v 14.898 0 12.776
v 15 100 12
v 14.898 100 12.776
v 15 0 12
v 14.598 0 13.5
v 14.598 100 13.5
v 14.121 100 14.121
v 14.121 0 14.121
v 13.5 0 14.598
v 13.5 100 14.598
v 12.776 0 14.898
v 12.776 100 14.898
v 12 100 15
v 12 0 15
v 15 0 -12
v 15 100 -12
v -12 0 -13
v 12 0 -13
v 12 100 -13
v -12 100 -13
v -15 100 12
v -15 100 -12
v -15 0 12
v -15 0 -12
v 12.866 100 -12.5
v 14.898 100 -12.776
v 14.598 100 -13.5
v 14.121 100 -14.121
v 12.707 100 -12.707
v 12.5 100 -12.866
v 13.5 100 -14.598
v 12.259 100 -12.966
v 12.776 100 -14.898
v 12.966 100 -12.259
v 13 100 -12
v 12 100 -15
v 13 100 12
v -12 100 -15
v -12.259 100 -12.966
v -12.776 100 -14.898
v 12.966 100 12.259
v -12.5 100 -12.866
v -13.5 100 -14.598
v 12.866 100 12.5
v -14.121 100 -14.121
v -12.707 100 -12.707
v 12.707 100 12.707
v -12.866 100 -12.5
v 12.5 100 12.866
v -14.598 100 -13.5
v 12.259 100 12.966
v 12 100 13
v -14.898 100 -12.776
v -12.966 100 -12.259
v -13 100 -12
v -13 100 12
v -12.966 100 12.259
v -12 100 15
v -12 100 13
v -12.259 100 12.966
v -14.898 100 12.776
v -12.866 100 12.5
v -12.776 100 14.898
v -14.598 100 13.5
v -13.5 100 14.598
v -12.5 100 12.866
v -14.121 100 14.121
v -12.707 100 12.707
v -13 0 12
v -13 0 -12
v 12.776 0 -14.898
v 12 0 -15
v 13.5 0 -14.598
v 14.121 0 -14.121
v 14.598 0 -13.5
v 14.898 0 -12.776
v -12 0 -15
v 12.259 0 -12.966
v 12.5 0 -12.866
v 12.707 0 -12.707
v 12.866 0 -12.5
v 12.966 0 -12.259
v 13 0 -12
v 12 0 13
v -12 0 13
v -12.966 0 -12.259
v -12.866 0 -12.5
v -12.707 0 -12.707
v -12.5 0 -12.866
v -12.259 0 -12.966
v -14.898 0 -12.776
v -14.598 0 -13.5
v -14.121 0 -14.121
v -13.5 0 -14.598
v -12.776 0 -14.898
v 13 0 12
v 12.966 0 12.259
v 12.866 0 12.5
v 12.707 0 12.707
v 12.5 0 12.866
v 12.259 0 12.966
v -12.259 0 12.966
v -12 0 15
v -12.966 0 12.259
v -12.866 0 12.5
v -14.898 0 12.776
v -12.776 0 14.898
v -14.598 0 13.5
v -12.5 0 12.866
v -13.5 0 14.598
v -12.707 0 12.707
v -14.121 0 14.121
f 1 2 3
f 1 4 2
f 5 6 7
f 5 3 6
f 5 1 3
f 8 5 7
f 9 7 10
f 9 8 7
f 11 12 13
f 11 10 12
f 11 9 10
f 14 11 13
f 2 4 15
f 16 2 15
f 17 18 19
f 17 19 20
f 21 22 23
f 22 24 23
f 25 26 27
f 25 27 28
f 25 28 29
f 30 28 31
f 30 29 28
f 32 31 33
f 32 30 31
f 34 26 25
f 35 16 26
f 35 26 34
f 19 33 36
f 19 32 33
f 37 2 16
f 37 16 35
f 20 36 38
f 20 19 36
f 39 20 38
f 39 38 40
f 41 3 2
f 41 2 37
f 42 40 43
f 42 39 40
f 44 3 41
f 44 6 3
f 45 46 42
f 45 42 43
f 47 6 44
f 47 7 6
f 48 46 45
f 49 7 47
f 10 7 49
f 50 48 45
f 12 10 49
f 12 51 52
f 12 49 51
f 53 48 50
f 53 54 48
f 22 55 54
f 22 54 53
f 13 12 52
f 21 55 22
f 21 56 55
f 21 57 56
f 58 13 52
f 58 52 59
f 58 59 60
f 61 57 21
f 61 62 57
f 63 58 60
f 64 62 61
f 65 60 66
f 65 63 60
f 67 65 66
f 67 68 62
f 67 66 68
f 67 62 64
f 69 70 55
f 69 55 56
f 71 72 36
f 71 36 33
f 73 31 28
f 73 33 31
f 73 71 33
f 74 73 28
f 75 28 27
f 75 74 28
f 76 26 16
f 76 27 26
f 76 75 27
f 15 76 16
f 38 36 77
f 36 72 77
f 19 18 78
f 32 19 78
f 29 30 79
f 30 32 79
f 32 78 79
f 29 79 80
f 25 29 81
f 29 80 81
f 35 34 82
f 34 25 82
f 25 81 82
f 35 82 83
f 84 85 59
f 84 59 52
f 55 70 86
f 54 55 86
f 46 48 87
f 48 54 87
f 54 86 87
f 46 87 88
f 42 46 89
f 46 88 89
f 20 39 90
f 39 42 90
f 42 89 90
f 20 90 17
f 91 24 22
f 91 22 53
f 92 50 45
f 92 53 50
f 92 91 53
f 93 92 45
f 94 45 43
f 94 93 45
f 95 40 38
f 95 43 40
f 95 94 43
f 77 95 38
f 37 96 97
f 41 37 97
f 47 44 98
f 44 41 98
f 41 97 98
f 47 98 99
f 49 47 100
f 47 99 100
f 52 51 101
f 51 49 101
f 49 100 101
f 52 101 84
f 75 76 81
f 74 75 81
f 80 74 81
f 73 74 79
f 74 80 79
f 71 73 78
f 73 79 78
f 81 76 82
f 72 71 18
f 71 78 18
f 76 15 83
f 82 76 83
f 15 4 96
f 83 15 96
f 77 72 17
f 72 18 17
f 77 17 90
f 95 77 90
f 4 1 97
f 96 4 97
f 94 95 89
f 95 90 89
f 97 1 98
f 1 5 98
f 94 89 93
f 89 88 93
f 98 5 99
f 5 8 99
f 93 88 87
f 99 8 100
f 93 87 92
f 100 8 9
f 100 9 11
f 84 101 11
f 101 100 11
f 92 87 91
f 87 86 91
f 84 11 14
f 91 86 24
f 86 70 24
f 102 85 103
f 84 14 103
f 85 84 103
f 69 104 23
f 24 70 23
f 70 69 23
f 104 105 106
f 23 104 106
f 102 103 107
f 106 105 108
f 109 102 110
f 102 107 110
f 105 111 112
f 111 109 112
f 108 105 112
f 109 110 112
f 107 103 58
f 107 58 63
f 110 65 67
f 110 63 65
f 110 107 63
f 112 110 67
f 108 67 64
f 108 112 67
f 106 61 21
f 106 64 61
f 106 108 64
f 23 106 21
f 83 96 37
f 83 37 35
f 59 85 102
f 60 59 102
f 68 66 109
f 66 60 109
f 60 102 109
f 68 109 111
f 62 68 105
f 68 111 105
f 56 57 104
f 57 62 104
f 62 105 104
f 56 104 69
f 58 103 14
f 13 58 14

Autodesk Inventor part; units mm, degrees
ref_plane "YZ Plane" through (0, 0, 0) normal (1, 0, 0) x (0, 1, 0)
ref_plane "XZ Plane" through (0, 0, 0) normal (0, 1, 0) x (-1, 0, 0)
ref_plane "XY Plane" through (0, 0, 0) normal (0, 0, 1) x (1, 0, 0)
sketch "Sketch1" plane through (0, 0, 0) normal (0, 1, 0) x (-1, 0, 0)
  line L0 (-12, 14) -> (12, 14) construction
  line L1 (14, 12) -> (14, -12) construction
  line L2 (12, -14) -> (-12, -14) construction
  line L3 (-14, -12) -> (-14, 12) construction
  line L4 (-14, 14) -> (14, -14) construction
  line L5 (14, 14) -> (-14, -14) construction
  arc A0 (14, 12) -> (12, 14) centre (12, 12) ccw construction
  arc A1 (12, -14) -> (14, -12) centre (12, -12) ccw construction
  arc A2 (-14, -12) -> (-12, -14) centre (-12, -12) ccw construction
  arc A3 (-12, 14) -> (-14, 12) centre (-12, 12) ccw construction
  line L6 (-12, -15) -> (12, -15)
  arc A4 (12, -15) -> (15, -12) centre (12, -12) ccw
  line L7 (15, -12) -> (15, 12)
  arc A5 (15, 12) -> (12, 15) centre (12, 12) ccw
  line L8 (12, 15) -> (-12, 15)
  arc A6 (-12, 15) -> (-15, 12) centre (-12, 12) ccw
  line L9 (-15, 12) -> (-15, -12)
  arc A7 (-15, -12) -> (-12, -15) centre (-12, -12) ccw
  line L10 (13, -12) -> (13, 12)
  arc A8 (13, 12) -> (12, 13) centre (12, 12) ccw
  line L11 (12, 13) -> (-12, 13)
  arc A9 (-12, 13) -> (-13, 12) centre (-12, 12) ccw
  line L12 (-13, 12) -> (-13, -12)
  arc A10 (-13, -12) -> (-12, -13) centre (-12, -12) ccw
  line L13 (-12, -13) -> (12, -13)
  arc A11 (12, -13) -> (13, -12) centre (12, -12) ccw
  point P0 (0, 0)
  point P1 (0, 0)
  point P2 (0, 0)
  dimension "d10" = 2
  dimension "depth" = 30
  dimension "width" = 30
  dimension "thickness" = 2
extrude "Extrusion1" add sketch "Sketch1" along normal blind 100
equation "\"d10\" = thickness"
properties part number "beam 30x30x2" material "Steel"
